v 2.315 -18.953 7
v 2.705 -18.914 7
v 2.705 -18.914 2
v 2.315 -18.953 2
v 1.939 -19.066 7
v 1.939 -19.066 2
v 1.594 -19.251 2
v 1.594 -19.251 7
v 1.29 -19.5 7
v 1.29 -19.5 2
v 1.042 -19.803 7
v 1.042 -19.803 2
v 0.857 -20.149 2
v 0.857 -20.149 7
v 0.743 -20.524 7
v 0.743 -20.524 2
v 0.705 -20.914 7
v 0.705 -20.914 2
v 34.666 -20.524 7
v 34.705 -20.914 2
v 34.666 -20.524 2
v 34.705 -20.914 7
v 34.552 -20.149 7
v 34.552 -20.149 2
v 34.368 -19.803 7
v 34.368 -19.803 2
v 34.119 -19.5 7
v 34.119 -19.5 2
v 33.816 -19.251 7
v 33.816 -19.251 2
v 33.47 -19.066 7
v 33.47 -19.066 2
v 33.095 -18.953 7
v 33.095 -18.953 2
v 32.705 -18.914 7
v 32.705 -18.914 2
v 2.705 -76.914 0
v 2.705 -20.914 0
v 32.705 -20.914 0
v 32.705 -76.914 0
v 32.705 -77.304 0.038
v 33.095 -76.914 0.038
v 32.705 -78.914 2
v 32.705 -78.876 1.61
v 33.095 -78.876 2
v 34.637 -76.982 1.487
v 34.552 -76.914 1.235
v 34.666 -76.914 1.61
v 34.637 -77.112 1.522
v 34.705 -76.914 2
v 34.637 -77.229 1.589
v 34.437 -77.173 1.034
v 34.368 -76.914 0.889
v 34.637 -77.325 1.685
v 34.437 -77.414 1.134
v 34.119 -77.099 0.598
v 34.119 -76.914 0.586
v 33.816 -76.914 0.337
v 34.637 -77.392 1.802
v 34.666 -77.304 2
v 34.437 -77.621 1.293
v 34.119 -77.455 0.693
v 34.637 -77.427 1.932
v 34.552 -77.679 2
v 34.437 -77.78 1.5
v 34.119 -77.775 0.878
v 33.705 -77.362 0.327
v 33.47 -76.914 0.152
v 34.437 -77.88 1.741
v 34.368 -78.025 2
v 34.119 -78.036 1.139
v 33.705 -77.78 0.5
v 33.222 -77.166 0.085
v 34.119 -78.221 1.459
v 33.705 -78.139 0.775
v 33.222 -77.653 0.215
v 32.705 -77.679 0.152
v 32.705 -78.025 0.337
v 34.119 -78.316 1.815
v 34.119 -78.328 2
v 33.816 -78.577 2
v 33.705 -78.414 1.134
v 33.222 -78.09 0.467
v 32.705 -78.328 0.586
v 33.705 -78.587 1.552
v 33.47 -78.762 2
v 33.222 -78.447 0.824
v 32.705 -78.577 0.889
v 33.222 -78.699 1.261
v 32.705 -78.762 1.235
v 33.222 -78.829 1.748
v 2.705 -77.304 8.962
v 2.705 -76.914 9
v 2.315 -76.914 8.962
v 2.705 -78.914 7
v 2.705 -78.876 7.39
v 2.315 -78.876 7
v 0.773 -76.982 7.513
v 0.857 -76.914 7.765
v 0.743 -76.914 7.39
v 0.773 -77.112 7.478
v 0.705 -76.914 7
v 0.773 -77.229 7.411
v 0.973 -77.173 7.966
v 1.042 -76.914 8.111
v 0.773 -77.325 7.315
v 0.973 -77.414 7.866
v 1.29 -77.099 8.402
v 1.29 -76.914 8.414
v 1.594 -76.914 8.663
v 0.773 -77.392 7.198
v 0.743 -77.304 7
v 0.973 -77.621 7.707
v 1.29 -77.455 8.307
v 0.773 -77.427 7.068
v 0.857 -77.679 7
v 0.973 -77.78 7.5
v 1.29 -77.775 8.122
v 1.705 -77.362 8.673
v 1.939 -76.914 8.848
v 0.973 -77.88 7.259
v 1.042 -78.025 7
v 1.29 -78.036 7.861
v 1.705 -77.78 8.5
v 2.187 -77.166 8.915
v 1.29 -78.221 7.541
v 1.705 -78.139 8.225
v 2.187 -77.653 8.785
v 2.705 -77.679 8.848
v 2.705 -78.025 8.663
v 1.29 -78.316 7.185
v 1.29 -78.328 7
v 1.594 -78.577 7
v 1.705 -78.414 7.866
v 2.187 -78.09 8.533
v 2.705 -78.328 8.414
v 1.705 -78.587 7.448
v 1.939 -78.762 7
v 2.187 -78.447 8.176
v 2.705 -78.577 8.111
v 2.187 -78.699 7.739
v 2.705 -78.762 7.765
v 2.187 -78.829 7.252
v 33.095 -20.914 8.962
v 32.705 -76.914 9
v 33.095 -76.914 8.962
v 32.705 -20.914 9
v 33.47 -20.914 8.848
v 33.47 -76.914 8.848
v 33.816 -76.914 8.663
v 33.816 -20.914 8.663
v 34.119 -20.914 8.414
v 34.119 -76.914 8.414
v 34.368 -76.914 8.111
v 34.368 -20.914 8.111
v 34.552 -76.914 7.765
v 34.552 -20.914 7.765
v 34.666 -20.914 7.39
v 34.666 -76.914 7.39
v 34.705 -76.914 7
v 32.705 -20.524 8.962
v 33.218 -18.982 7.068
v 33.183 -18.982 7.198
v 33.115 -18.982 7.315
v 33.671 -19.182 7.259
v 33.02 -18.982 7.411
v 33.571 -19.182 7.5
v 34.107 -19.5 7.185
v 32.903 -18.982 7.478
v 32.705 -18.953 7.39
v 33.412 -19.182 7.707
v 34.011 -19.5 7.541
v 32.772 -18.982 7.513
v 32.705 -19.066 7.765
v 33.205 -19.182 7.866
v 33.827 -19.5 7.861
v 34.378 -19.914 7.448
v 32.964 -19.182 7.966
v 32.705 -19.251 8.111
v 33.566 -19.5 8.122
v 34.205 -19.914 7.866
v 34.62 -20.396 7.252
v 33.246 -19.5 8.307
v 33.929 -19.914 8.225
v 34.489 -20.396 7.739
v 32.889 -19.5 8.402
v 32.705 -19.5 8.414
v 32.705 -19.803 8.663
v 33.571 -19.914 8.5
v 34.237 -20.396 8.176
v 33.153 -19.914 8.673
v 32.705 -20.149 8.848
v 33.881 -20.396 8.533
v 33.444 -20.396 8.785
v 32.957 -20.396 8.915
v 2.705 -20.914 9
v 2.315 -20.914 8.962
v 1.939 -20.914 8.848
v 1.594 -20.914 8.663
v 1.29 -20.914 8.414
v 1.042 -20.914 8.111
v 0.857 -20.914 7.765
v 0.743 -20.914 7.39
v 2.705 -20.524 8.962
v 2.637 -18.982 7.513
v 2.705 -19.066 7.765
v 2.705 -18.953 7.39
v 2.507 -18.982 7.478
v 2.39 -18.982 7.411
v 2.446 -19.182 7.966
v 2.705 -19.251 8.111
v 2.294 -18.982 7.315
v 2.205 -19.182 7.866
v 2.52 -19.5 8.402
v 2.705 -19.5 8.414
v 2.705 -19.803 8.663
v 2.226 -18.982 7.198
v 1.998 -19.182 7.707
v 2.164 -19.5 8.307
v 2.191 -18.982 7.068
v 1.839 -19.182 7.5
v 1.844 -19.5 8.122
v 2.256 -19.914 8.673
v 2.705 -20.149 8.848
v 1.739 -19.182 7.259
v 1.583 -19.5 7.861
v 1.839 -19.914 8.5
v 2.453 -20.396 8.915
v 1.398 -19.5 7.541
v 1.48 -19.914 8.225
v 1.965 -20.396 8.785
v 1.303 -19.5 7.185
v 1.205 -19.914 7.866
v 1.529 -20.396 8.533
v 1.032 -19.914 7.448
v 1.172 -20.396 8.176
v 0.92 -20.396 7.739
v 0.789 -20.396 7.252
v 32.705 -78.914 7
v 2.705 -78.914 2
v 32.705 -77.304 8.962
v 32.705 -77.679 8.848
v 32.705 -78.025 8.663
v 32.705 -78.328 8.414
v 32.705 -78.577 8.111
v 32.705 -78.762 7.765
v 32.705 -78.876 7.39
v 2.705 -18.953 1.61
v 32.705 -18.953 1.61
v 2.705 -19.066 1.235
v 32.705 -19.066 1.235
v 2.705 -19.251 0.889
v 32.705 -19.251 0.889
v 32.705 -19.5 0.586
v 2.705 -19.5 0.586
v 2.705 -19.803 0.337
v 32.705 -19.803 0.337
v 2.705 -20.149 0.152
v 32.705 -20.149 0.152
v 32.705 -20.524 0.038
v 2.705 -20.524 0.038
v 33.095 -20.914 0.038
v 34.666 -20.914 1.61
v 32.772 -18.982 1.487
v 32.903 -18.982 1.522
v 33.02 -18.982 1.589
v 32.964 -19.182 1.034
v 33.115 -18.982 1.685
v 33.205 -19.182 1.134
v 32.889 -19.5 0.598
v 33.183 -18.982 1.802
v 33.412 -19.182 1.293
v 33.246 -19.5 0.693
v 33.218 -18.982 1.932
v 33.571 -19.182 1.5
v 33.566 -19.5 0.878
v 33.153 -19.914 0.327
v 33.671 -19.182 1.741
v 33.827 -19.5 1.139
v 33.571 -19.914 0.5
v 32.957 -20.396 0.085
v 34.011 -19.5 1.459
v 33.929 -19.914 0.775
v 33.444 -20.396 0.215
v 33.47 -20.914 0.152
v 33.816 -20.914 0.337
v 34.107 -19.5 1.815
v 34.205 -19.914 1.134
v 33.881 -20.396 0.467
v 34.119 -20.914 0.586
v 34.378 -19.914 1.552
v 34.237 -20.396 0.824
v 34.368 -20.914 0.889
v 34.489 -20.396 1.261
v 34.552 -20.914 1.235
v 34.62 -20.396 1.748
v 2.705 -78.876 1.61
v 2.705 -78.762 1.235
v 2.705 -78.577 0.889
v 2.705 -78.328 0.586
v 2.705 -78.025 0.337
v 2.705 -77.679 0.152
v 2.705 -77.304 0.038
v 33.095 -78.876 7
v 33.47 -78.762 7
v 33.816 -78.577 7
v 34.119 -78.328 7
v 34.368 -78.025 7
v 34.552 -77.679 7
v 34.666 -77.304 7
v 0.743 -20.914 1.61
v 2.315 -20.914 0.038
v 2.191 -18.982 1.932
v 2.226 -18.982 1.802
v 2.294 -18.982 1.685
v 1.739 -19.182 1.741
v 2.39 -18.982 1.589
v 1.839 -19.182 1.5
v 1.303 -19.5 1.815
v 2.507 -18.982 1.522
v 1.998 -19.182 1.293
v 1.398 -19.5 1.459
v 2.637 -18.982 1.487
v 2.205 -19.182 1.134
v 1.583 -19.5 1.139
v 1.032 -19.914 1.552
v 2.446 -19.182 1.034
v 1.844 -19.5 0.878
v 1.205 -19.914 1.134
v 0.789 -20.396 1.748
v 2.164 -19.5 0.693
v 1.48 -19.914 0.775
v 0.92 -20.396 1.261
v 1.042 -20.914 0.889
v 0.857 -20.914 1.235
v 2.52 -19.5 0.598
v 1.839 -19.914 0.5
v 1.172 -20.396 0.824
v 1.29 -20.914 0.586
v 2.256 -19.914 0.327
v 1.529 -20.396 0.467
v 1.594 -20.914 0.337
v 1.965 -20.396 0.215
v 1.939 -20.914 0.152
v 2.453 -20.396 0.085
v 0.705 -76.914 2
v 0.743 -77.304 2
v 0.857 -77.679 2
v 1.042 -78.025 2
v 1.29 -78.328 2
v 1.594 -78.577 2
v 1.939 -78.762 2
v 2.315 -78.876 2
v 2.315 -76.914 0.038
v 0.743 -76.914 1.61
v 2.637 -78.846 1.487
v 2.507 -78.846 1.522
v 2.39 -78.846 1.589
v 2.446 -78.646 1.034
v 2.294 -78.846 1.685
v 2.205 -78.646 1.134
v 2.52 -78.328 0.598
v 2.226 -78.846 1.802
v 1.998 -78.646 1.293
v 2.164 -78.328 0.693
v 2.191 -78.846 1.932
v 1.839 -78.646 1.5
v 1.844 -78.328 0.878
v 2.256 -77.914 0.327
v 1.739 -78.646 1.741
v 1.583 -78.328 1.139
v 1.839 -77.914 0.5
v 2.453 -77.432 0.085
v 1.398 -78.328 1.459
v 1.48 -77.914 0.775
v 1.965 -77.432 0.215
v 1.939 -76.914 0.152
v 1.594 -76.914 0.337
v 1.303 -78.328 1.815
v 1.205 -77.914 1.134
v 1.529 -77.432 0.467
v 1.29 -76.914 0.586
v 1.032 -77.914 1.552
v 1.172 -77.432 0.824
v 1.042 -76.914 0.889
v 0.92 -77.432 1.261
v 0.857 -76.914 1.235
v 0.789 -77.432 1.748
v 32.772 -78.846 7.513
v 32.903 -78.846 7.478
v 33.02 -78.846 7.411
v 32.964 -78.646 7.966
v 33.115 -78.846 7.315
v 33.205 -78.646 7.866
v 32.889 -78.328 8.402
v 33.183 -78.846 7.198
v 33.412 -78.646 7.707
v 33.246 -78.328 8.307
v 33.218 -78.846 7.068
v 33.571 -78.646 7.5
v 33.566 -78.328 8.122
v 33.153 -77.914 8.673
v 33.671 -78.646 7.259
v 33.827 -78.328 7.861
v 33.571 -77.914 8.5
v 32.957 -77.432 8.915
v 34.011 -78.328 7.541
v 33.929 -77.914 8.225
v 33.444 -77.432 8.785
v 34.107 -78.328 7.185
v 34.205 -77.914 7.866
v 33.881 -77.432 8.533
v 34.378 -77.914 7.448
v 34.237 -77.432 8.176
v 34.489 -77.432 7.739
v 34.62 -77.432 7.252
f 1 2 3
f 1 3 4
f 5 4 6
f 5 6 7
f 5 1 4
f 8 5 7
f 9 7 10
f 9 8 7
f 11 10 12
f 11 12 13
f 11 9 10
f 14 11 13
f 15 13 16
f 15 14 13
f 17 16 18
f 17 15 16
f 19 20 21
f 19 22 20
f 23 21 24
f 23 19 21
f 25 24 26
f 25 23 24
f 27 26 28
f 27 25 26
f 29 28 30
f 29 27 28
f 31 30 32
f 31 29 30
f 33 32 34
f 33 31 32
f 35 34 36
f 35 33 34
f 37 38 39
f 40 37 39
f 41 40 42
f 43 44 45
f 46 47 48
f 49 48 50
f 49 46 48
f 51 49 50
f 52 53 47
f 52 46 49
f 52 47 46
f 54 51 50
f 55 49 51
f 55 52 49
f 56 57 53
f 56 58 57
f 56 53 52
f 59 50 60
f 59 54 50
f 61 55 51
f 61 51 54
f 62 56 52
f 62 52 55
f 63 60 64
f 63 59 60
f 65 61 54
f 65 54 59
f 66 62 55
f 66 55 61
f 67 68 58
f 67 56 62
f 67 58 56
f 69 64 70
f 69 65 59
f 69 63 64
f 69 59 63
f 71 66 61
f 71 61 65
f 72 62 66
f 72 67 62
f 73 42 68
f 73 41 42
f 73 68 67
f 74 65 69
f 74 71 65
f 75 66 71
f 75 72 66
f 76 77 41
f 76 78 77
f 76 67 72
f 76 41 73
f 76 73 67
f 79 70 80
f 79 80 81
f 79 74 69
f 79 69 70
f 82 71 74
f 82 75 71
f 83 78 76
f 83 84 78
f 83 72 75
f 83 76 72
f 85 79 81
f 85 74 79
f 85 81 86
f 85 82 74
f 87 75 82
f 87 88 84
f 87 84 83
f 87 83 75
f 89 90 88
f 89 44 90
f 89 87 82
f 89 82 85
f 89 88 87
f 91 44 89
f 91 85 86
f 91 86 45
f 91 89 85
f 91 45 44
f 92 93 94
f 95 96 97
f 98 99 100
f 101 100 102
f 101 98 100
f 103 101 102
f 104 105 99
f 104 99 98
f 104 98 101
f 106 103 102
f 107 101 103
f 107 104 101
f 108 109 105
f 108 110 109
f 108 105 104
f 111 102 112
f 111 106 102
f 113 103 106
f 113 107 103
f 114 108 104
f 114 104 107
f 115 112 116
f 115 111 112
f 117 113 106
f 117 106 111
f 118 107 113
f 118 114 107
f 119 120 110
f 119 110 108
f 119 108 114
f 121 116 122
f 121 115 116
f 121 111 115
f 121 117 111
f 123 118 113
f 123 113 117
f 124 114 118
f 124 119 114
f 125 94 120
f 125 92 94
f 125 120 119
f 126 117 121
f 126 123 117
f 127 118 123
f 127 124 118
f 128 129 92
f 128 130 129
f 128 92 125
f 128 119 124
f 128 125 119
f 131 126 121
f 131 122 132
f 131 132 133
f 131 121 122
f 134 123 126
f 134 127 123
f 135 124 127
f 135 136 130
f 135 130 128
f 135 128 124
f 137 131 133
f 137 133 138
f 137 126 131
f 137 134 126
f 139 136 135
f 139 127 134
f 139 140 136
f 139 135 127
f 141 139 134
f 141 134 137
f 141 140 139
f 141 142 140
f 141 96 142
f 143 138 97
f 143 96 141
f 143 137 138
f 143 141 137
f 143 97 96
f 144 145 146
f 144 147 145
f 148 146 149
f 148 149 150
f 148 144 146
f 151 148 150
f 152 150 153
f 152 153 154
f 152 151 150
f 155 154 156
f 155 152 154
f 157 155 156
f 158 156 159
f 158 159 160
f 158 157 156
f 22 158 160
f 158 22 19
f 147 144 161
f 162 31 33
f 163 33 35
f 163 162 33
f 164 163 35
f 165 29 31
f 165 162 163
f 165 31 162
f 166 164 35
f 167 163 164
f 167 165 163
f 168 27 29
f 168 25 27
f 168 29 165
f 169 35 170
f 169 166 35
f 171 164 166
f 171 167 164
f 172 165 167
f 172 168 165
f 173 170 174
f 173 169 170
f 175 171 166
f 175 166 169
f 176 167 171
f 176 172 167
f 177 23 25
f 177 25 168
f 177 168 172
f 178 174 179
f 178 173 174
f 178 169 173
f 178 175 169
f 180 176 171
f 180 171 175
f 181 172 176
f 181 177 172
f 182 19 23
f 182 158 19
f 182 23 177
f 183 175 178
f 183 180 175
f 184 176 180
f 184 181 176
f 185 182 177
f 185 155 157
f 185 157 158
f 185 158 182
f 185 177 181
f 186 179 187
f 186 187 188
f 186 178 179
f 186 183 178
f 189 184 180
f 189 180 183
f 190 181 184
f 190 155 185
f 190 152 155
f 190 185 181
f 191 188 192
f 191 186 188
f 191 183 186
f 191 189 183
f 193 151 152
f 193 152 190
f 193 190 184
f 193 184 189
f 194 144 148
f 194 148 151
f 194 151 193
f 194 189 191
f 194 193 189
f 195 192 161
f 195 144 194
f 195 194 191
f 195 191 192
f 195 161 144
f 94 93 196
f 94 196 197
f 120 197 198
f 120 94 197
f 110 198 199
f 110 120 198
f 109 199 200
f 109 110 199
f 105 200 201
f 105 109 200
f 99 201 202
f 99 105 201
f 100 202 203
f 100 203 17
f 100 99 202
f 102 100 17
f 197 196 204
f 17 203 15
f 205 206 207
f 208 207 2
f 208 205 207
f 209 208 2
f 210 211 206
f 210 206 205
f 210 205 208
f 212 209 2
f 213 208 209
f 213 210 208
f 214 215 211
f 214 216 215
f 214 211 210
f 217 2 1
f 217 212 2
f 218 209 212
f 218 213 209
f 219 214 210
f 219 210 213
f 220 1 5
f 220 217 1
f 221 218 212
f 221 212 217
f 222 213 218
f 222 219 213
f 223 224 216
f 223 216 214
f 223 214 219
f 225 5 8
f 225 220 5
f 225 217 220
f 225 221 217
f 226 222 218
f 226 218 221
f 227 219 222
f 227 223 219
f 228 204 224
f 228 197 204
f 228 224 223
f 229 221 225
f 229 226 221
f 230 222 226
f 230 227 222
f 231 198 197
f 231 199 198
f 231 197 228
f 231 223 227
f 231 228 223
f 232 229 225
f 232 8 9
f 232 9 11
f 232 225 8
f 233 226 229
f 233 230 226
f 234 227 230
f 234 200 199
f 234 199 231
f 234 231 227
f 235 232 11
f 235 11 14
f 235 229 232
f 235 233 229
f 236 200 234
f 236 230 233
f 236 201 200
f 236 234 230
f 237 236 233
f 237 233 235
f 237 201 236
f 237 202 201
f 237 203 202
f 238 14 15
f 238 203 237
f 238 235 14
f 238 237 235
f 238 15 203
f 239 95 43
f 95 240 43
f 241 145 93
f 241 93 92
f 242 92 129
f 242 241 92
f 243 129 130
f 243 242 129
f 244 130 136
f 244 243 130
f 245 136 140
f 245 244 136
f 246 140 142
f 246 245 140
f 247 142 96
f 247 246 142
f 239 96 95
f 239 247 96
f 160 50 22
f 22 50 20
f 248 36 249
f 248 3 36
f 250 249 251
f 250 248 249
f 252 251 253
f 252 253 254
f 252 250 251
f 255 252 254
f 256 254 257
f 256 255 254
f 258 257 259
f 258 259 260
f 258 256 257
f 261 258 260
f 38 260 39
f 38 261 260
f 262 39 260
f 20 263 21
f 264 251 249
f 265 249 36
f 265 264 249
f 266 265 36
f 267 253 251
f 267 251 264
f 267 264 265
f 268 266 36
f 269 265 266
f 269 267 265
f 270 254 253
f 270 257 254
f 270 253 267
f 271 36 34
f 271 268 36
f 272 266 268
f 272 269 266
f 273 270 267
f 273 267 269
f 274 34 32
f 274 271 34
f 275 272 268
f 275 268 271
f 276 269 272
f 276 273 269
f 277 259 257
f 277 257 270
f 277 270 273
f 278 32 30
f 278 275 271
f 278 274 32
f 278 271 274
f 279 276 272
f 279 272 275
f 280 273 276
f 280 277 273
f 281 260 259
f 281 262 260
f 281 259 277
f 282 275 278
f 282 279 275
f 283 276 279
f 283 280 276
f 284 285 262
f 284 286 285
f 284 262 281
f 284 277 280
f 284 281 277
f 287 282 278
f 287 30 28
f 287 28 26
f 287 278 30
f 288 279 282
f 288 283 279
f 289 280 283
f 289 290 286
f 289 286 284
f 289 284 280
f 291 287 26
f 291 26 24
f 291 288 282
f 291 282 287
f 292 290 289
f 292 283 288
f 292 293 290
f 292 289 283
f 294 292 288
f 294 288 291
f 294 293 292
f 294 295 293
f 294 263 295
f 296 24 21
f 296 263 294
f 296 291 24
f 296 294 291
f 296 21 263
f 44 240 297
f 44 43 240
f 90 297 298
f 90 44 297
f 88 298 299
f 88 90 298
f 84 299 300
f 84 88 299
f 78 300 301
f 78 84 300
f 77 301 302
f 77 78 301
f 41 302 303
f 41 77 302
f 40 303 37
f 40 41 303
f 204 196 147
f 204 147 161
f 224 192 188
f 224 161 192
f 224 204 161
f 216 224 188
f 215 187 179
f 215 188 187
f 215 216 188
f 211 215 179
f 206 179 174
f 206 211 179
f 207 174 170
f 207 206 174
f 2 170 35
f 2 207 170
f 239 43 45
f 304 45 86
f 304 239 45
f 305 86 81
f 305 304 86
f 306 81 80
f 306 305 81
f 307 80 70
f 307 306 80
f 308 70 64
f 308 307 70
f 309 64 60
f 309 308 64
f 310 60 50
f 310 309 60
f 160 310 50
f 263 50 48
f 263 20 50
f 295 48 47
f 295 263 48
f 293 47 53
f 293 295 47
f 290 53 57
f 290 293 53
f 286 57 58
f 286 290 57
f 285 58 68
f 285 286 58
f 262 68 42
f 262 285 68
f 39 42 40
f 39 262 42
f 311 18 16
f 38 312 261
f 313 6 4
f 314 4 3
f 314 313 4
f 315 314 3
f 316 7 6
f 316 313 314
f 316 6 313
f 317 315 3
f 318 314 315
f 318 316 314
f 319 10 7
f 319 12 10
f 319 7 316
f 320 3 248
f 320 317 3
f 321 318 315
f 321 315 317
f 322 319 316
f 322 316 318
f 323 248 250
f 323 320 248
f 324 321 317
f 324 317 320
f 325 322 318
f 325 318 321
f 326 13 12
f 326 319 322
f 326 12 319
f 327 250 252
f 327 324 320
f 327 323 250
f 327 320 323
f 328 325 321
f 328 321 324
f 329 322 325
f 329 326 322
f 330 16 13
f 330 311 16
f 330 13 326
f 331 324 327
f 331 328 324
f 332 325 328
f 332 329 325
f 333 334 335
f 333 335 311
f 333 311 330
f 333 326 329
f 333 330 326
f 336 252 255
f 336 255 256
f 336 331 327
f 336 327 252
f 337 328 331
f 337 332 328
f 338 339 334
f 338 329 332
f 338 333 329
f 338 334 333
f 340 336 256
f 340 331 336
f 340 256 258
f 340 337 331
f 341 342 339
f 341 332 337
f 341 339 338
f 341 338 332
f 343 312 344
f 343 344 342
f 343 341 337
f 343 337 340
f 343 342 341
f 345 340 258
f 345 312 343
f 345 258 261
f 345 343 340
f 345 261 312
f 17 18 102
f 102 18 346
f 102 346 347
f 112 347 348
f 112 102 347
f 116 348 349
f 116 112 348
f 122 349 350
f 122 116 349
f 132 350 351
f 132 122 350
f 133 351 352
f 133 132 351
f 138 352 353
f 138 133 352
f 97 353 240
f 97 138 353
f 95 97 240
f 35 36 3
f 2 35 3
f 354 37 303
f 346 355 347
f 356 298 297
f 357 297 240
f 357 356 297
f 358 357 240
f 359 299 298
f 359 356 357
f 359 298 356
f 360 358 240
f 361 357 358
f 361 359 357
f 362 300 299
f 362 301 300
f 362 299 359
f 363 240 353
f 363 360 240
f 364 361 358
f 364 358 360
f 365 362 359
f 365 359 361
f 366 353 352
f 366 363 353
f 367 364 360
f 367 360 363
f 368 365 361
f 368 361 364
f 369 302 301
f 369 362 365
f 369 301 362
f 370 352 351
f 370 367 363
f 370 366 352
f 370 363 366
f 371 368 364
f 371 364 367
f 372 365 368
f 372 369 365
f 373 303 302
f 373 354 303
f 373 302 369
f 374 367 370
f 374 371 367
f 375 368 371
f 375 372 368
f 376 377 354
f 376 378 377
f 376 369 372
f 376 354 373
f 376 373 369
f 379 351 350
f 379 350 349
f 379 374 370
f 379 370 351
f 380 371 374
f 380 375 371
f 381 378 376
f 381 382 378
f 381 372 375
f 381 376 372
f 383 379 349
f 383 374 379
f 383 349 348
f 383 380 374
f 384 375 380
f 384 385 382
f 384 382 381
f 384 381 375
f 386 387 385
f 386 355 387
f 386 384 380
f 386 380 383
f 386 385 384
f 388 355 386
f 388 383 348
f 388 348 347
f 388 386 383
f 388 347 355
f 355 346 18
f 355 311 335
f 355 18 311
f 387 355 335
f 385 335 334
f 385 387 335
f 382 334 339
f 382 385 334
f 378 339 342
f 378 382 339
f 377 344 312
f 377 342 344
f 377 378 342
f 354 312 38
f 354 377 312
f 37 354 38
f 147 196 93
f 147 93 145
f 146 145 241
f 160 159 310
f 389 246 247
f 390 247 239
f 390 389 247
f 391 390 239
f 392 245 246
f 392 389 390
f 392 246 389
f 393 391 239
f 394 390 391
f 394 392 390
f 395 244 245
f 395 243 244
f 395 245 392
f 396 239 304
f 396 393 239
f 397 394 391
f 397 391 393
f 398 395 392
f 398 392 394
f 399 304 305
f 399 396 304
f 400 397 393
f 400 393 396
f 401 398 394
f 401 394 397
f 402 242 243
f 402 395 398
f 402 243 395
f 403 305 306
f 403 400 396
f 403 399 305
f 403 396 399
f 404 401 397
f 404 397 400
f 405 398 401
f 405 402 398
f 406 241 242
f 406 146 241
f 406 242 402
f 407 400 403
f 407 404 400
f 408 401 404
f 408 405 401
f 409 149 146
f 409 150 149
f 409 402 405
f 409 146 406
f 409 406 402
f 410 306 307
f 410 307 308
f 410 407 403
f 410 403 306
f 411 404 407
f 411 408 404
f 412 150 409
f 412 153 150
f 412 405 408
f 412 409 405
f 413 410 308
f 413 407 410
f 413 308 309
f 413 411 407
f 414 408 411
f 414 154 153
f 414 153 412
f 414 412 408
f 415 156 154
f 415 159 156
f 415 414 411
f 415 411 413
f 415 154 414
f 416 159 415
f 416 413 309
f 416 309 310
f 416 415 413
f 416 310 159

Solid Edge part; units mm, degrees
sketch "Sketch1" plane through (0, 0, 0) normal (0, 0, 1) x (1, 0, 0)
  line L0 (0.7047, -78.9141) -> (34.7047, -78.9141)
  line L1 (34.7047, -78.9141) -> (34.7047, -18.9141)
  line L2 (34.7047, -18.9141) -> (0.7047, -18.9141)
  line L3 (0.7047, -18.9141) -> (0.7047, -78.9141)
extrude "Protrusion1" add sketch "Sketch1" along normal blind 9
fillet "Round_1" radius 2 12 edges at (0.7047, -48.9141, 0) (17.7047, -78.9141, 0) (34.7047, -48.9141, 0) (17.7047, -18.9141, 0) (34.7047, -48.9141, 9) (17.7047, -78.9141, 9) (0.7047, -48.9141, 9) (17.7047, -18.9141, 9) (0.7047, -18.9141, 4.5) (0.7047, -78.9141, 4.5) (34.7047, -78.9141, 4.5) (34.7047, -18.9141, 4.5)
properties material "Zinc"
